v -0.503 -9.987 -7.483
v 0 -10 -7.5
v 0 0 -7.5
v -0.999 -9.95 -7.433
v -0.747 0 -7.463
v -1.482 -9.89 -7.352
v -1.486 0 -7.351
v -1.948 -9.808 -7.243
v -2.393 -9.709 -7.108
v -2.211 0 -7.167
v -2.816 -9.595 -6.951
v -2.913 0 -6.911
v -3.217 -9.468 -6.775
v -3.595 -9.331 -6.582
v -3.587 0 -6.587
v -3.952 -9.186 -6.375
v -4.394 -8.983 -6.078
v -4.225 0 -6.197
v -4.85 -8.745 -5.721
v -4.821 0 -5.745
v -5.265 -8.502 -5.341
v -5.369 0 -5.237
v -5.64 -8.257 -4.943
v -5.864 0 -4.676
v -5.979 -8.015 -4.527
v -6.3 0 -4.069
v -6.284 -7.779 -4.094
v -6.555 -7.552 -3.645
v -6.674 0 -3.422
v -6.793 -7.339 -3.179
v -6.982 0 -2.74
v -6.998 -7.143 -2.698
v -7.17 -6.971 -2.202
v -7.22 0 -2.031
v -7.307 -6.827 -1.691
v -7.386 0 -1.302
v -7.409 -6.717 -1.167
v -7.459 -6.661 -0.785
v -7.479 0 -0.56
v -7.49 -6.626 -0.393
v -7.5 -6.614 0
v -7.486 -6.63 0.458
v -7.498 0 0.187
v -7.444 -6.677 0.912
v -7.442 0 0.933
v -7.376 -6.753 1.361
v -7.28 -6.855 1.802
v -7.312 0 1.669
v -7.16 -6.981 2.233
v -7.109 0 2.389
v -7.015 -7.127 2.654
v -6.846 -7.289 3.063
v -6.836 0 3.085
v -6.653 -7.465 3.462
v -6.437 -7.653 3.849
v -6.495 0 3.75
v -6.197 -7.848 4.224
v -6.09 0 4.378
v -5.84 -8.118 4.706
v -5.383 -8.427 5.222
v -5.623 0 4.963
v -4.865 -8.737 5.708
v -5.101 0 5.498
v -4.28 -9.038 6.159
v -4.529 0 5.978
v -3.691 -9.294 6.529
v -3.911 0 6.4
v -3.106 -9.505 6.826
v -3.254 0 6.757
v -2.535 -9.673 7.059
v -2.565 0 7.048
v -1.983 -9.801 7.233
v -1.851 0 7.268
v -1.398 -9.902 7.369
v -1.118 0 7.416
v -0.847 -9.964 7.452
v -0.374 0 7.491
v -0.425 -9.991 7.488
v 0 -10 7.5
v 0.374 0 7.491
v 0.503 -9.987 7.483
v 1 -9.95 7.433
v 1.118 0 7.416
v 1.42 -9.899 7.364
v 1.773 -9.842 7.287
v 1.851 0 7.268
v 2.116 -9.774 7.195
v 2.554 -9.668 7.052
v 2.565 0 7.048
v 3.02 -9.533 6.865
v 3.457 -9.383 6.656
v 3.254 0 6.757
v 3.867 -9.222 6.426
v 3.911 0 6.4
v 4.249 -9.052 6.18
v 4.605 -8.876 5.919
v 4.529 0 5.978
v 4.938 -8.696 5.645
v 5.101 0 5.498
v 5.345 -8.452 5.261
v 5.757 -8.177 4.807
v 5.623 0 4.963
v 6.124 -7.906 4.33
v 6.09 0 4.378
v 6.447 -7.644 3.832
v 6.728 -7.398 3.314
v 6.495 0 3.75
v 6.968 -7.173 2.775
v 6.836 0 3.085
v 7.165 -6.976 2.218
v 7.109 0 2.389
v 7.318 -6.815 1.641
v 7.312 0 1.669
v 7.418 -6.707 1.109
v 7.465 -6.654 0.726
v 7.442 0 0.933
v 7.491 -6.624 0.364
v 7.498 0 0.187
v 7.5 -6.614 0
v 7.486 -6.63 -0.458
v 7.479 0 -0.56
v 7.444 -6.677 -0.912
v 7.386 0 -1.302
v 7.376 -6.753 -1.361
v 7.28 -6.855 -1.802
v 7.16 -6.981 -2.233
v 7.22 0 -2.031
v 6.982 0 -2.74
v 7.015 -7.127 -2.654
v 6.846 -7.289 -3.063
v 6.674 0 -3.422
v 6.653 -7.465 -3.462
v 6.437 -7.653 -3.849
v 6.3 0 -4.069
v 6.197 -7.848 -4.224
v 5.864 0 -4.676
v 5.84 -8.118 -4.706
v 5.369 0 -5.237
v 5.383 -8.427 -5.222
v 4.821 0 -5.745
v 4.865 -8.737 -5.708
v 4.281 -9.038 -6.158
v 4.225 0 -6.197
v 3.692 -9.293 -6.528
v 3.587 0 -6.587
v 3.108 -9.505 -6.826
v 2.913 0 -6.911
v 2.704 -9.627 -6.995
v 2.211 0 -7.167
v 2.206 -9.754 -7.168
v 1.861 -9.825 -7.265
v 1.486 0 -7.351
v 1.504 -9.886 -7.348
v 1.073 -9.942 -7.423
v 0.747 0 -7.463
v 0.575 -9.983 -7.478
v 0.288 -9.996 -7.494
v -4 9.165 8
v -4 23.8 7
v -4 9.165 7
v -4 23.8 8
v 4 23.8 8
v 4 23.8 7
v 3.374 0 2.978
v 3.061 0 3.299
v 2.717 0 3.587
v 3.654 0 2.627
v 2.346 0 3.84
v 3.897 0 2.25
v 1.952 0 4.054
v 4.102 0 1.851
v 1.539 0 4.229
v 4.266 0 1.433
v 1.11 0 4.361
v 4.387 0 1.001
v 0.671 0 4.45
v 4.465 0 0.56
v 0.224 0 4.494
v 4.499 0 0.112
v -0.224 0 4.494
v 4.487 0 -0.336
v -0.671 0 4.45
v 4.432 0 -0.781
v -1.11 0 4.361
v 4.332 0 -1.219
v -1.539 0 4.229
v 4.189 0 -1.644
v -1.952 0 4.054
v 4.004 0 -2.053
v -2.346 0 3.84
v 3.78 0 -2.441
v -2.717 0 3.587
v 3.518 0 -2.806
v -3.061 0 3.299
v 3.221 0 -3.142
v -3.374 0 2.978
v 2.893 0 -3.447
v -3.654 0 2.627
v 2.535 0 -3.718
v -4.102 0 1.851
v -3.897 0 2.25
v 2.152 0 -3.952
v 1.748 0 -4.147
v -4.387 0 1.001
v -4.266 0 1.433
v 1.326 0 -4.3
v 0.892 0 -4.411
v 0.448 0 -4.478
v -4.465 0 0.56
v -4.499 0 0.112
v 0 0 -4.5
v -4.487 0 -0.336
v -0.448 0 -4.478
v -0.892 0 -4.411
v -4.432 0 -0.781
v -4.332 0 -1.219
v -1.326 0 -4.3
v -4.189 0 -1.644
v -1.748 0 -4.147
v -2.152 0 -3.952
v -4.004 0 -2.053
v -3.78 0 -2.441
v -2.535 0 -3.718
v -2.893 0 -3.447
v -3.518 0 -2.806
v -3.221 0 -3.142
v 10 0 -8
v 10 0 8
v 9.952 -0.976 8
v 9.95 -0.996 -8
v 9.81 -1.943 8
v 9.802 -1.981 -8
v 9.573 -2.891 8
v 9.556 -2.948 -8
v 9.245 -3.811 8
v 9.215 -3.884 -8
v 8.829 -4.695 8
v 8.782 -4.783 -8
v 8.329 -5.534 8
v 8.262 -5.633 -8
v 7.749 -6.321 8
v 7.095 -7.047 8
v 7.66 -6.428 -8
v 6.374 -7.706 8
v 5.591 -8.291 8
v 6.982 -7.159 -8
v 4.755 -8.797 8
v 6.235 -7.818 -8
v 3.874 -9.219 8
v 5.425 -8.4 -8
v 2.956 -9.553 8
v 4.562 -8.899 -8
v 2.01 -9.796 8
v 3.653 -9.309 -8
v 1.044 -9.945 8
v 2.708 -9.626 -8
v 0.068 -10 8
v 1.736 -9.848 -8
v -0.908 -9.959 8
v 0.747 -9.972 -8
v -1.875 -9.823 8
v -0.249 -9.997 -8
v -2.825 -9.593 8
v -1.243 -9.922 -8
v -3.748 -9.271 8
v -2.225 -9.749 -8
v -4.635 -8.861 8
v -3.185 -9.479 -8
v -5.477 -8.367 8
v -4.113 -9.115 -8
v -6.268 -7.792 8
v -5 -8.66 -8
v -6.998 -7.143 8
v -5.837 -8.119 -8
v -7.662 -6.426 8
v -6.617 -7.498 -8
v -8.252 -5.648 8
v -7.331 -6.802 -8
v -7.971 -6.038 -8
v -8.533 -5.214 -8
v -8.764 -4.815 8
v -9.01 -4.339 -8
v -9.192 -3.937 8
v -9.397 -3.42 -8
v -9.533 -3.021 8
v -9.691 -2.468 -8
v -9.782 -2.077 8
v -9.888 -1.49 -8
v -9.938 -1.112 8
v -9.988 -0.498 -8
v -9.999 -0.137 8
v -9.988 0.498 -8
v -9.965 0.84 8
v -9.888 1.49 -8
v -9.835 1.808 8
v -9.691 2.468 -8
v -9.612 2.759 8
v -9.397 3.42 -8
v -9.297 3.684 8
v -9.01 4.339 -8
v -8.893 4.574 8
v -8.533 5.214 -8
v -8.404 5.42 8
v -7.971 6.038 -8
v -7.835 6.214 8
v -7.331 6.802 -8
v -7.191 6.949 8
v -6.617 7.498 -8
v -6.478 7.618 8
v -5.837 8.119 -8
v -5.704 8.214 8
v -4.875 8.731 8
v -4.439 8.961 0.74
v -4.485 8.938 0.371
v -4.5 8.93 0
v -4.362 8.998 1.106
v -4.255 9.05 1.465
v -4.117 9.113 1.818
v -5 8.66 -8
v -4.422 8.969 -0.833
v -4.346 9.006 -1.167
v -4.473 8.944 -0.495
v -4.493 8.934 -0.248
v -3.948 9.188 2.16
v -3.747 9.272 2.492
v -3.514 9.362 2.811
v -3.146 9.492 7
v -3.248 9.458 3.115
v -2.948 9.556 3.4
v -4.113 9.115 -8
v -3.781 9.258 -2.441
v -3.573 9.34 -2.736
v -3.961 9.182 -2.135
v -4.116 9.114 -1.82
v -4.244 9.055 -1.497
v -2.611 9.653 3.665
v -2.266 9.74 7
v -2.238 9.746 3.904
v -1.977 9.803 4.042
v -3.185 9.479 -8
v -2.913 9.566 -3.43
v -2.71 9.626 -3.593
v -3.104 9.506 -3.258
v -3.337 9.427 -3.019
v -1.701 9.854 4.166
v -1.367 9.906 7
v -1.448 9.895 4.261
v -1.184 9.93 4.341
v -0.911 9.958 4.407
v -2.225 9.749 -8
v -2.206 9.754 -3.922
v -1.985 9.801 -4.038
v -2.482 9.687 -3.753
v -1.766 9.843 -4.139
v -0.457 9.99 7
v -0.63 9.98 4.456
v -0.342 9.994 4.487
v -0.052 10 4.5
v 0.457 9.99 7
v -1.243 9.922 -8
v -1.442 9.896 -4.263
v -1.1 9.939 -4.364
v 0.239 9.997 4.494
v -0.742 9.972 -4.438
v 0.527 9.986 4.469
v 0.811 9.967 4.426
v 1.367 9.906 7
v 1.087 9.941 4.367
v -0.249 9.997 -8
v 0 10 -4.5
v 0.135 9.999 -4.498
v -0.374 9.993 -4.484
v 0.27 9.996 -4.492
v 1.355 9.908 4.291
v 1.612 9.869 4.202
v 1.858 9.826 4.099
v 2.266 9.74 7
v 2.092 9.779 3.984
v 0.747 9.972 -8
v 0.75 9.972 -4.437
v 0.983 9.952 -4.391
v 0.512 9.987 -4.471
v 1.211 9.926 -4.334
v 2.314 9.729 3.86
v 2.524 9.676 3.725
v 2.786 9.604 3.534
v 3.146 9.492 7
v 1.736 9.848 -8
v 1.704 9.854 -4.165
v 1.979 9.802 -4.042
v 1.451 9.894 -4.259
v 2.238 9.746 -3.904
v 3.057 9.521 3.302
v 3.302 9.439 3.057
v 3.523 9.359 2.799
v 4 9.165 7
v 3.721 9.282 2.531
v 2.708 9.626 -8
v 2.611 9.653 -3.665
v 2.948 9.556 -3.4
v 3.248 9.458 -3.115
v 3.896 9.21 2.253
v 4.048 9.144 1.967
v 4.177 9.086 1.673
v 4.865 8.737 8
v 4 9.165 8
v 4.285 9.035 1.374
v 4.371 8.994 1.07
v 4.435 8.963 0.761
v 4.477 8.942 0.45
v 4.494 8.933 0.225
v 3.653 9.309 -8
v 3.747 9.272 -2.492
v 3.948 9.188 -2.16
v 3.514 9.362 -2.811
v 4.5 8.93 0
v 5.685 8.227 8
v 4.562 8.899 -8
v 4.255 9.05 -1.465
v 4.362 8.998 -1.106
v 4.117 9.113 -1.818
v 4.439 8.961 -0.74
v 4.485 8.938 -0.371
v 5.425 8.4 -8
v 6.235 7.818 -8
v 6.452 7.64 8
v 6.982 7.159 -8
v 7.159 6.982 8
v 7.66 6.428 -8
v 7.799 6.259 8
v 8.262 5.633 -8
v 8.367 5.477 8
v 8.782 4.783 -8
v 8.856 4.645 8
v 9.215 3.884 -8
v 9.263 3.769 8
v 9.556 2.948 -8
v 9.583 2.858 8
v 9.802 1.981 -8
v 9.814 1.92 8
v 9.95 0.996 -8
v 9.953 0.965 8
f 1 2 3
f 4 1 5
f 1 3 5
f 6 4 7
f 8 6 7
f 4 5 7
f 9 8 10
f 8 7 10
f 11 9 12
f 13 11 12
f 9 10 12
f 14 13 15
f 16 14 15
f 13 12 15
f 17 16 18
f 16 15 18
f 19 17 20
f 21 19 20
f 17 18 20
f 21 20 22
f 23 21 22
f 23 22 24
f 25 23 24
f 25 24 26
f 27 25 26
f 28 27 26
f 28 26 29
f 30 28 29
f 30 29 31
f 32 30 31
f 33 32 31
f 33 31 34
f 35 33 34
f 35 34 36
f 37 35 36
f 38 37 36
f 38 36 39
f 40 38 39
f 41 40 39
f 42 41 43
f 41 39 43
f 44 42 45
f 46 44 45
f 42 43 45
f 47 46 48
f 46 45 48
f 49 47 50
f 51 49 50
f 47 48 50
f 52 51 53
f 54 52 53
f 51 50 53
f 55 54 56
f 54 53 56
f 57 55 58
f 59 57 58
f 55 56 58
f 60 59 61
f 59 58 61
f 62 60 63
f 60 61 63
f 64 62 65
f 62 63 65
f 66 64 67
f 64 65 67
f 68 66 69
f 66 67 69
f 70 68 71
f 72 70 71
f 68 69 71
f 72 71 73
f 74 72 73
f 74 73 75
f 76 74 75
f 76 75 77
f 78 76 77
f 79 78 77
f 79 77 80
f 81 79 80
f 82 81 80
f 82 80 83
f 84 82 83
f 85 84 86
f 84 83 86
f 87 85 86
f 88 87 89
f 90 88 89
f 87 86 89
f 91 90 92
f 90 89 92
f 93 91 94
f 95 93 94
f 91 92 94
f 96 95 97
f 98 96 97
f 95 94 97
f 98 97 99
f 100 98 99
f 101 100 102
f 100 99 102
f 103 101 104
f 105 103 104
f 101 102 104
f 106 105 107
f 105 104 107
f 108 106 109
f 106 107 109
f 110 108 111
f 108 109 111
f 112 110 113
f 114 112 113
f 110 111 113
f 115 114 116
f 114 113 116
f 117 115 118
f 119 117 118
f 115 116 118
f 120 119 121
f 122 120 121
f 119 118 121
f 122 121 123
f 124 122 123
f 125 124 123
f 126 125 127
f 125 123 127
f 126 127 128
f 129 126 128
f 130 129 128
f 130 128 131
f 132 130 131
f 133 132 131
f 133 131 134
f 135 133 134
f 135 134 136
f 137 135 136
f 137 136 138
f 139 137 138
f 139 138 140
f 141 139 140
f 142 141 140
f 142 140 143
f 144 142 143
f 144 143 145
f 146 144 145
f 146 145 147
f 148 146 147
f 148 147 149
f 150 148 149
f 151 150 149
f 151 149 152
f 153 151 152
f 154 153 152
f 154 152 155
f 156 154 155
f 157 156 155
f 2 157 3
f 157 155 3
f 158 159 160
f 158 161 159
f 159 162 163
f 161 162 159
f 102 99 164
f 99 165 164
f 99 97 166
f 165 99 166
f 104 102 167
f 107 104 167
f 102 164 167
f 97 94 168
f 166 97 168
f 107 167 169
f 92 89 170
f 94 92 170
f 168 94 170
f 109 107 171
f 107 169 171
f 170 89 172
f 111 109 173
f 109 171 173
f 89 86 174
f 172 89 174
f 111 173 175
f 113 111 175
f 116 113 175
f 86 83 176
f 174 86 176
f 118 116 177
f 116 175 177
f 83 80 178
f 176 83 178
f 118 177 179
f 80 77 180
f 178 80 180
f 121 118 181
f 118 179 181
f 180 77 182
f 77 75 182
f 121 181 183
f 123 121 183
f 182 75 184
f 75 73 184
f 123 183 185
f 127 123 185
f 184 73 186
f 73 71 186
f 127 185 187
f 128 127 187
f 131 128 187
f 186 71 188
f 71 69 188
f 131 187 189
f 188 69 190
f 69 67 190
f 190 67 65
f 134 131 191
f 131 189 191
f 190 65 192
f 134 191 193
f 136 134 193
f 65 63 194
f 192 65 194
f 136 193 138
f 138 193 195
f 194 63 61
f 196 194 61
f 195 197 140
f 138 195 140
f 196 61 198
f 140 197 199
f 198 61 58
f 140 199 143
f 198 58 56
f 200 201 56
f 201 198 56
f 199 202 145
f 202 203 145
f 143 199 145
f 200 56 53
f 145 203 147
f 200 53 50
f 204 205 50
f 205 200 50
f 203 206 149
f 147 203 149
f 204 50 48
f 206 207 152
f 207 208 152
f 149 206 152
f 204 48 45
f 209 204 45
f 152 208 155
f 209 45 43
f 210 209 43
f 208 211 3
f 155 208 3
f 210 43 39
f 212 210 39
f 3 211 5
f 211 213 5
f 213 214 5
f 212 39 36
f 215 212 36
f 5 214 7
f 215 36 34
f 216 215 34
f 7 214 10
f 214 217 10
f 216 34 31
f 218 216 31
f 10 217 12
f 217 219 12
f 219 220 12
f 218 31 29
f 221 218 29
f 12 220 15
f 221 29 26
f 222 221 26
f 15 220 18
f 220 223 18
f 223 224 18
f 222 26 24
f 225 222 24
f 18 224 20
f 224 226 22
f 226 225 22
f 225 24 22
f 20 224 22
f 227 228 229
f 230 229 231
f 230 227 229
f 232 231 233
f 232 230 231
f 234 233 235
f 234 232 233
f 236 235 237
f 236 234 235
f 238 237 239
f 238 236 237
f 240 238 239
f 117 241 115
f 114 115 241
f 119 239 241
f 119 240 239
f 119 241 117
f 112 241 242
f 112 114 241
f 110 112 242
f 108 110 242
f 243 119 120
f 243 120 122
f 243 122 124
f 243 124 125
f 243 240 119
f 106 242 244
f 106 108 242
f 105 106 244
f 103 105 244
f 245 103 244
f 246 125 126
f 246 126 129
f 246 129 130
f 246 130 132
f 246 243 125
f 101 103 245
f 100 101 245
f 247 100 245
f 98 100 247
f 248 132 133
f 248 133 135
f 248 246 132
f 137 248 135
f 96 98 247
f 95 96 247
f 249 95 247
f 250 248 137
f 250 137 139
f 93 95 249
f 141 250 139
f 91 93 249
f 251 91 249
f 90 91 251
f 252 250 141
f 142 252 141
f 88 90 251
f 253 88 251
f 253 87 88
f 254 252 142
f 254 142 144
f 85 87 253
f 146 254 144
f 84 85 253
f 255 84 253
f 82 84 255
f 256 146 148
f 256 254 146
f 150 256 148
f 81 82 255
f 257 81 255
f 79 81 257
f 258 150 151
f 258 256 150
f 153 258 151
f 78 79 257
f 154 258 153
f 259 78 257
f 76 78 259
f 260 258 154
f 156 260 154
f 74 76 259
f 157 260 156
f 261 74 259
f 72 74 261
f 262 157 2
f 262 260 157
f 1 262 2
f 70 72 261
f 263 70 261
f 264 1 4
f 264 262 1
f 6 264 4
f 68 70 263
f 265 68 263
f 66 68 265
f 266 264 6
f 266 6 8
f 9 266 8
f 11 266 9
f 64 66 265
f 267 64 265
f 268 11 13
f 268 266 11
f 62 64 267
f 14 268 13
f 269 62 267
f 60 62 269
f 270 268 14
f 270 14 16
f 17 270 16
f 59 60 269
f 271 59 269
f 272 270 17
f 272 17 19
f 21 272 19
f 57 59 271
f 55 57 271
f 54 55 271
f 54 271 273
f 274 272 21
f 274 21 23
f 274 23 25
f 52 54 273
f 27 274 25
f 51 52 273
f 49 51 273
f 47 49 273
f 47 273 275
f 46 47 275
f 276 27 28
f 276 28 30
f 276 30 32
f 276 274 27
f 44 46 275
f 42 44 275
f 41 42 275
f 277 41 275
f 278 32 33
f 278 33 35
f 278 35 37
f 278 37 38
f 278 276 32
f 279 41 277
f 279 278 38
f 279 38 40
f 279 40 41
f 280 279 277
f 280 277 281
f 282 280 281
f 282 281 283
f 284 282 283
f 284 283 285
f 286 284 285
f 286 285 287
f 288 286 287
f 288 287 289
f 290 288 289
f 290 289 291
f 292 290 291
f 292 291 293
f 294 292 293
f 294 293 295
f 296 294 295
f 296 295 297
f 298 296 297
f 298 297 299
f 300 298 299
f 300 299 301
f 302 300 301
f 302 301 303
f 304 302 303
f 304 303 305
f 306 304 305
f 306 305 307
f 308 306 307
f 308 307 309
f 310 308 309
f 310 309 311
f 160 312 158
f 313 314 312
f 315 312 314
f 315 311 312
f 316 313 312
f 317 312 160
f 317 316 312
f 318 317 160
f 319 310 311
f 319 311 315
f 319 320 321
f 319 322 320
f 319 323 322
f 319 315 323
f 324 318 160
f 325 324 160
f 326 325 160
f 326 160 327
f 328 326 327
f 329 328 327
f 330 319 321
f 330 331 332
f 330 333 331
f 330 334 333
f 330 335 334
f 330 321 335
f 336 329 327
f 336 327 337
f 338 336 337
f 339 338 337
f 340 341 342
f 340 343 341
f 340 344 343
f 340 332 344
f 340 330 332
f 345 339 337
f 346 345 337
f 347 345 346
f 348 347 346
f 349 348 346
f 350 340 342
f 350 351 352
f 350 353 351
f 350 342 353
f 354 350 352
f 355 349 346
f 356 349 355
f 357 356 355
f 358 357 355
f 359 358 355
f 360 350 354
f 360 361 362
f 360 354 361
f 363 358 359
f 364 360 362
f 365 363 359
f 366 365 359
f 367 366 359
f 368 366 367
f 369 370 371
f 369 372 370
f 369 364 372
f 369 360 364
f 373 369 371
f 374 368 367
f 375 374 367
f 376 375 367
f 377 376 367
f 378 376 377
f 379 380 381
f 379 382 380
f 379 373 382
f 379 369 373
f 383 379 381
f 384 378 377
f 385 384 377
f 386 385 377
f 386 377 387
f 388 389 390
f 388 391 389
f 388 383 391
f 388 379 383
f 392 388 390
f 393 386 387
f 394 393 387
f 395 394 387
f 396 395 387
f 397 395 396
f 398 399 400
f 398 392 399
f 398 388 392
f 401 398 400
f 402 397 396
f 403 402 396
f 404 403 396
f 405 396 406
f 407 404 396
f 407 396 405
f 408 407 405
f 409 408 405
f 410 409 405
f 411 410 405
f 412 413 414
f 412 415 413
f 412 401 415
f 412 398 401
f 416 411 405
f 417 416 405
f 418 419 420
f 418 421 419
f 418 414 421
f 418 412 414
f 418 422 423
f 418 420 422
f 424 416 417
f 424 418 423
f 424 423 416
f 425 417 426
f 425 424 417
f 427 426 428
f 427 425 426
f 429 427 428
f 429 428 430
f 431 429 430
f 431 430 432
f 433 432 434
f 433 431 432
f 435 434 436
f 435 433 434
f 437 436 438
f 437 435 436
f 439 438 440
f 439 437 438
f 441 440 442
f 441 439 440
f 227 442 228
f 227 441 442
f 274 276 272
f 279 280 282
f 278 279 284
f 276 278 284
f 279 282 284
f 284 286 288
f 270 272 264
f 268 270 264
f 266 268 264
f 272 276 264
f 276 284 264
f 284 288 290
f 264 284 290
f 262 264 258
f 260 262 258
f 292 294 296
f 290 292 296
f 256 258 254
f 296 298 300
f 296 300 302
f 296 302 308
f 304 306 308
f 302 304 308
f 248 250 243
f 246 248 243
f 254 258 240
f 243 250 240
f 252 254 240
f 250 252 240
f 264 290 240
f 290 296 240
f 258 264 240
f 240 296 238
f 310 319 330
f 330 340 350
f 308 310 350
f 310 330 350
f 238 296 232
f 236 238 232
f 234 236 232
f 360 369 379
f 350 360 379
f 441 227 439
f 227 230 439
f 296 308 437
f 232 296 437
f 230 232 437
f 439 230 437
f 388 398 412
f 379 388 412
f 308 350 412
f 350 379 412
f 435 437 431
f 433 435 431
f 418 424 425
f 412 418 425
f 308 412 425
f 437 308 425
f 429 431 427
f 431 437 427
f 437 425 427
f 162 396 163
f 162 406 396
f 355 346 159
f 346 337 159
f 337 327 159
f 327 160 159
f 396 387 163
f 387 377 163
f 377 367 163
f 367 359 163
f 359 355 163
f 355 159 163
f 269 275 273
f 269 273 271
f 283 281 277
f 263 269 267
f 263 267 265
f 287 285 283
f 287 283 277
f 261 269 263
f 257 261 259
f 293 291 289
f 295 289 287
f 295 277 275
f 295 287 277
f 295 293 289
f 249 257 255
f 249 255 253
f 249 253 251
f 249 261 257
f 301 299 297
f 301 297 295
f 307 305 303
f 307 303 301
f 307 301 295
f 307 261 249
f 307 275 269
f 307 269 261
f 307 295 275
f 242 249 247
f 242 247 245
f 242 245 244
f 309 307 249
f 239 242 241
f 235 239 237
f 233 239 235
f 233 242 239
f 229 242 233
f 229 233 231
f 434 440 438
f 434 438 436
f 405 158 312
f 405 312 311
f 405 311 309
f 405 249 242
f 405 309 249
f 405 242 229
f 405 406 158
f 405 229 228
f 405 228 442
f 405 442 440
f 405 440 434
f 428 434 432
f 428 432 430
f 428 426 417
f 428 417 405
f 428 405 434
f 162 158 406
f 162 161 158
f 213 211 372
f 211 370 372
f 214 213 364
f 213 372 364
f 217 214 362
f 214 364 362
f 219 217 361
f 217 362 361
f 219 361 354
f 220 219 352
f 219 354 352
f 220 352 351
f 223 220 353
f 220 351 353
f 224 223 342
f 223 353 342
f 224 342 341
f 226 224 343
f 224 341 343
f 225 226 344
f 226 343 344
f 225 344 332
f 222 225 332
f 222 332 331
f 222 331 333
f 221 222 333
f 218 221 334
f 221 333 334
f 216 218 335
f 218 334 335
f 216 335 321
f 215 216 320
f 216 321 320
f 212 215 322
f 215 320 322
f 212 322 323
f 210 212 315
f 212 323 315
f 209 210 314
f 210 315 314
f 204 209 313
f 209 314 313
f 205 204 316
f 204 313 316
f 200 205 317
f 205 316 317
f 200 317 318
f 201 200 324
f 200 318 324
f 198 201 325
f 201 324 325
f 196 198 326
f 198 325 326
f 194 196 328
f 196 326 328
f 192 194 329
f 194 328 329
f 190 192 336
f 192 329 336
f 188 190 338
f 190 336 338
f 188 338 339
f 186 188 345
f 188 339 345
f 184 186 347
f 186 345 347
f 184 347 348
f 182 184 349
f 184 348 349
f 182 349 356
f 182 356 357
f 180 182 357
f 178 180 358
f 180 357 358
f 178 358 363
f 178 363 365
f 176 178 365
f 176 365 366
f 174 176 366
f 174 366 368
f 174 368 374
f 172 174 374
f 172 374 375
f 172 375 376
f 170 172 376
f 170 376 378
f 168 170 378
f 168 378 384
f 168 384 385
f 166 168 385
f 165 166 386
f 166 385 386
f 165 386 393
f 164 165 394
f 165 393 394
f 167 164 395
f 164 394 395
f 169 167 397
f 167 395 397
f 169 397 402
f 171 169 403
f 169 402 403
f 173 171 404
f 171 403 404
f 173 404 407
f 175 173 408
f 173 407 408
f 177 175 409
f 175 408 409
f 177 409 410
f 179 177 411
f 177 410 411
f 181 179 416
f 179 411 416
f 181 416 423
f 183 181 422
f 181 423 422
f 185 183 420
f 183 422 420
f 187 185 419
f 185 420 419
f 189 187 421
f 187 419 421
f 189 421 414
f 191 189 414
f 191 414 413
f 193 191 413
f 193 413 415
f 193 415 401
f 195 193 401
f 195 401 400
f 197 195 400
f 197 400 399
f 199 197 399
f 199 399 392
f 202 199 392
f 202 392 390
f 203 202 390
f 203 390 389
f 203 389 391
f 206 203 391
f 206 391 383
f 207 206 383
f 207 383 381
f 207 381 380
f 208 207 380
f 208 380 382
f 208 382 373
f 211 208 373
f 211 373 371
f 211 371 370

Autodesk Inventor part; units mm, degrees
ref_plane "YZ Plane" through (0, 0, 0) normal (1, 0, 0) x (0, 1, 0)
ref_plane "XZ Plane" through (0, 0, 0) normal (0, 1, 0) x (-1, 0, 0)
ref_plane "XY Plane" through (0, 0, 0) normal (0, 0, 1) x (1, 0, 0)
sketch "Sketch1" plane through (0, 0, 0) normal (0, 0, 1) x (1, 0, 0)
  circle A0 centre (0, 0) radius 10
  dimension "Diameter" = 20
extrude "Base" add sketch "Sketch1" along normal mid plane 16
sketch "Sketch3" plane through (0, 0, 0) normal (0, 1, 0) x (-1, 0, 0)
  line L0 (-10, -8) -> (-10, 8) projected
  line L1 (10, -8) -> (10, 8) projected
  line L2 (-10, 8) -> (10, 8) projected
  line L3 (10, -8) -> (-10, -8) projected
  line L4 (-10, 2.2) -> (0.5164, -8)
  line L5 (-0.5164, -8) -> (10, 2.2)
  line L6 (0, -11.2) -> (0, 11.2) construction
  dimension "d43" = 91.75
  dimension "d44" = 5.8
extrude "Pneumatic Cut" [suppressed]
sketch "Sketch2" plane through (0, 0, 8) normal (0, 0, 1) x (1, 0, 0)
  circle A0 centre (0, 0) radius 10 projected
  line L0 (-4, 9.1652) -> (4, 9.1652)
  line L1 (4, 9.1652) -> (4, 23.8)
  line L2 (4, 23.8) -> (-4, 23.8)
  line L3 (-4, 23.8) -> (-4, 9.1652)
  point P0 (0, 23.8)
  dimension "Tab_Length" = 33.8
  dimension "Tab_Width" = 8
extrude "Tab" add sketch "Sketch2" against normal blind 1 contours A0 L3 L2 L1
hole "M6 Thru Hole" [suppressed]
hole "M8 Thru Hole" at (0, -10, 0) direction (0, 1, 0) diameter 9 end through all counterbore diameter 15 counterbore depth 10 clearance for "Socket Head Cap Screw" size "M8" standard "Ansi Metric M Profile"
hole "M6 Threaded" [suppressed]
hole "M8 Threaded" [suppressed]
equation "\"d21\" = 0.5 * Diameter"
equation "\"d8\" = 0.5 * Diameter"
properties part number "20-004Z1" material "Zinc ZA-12"
